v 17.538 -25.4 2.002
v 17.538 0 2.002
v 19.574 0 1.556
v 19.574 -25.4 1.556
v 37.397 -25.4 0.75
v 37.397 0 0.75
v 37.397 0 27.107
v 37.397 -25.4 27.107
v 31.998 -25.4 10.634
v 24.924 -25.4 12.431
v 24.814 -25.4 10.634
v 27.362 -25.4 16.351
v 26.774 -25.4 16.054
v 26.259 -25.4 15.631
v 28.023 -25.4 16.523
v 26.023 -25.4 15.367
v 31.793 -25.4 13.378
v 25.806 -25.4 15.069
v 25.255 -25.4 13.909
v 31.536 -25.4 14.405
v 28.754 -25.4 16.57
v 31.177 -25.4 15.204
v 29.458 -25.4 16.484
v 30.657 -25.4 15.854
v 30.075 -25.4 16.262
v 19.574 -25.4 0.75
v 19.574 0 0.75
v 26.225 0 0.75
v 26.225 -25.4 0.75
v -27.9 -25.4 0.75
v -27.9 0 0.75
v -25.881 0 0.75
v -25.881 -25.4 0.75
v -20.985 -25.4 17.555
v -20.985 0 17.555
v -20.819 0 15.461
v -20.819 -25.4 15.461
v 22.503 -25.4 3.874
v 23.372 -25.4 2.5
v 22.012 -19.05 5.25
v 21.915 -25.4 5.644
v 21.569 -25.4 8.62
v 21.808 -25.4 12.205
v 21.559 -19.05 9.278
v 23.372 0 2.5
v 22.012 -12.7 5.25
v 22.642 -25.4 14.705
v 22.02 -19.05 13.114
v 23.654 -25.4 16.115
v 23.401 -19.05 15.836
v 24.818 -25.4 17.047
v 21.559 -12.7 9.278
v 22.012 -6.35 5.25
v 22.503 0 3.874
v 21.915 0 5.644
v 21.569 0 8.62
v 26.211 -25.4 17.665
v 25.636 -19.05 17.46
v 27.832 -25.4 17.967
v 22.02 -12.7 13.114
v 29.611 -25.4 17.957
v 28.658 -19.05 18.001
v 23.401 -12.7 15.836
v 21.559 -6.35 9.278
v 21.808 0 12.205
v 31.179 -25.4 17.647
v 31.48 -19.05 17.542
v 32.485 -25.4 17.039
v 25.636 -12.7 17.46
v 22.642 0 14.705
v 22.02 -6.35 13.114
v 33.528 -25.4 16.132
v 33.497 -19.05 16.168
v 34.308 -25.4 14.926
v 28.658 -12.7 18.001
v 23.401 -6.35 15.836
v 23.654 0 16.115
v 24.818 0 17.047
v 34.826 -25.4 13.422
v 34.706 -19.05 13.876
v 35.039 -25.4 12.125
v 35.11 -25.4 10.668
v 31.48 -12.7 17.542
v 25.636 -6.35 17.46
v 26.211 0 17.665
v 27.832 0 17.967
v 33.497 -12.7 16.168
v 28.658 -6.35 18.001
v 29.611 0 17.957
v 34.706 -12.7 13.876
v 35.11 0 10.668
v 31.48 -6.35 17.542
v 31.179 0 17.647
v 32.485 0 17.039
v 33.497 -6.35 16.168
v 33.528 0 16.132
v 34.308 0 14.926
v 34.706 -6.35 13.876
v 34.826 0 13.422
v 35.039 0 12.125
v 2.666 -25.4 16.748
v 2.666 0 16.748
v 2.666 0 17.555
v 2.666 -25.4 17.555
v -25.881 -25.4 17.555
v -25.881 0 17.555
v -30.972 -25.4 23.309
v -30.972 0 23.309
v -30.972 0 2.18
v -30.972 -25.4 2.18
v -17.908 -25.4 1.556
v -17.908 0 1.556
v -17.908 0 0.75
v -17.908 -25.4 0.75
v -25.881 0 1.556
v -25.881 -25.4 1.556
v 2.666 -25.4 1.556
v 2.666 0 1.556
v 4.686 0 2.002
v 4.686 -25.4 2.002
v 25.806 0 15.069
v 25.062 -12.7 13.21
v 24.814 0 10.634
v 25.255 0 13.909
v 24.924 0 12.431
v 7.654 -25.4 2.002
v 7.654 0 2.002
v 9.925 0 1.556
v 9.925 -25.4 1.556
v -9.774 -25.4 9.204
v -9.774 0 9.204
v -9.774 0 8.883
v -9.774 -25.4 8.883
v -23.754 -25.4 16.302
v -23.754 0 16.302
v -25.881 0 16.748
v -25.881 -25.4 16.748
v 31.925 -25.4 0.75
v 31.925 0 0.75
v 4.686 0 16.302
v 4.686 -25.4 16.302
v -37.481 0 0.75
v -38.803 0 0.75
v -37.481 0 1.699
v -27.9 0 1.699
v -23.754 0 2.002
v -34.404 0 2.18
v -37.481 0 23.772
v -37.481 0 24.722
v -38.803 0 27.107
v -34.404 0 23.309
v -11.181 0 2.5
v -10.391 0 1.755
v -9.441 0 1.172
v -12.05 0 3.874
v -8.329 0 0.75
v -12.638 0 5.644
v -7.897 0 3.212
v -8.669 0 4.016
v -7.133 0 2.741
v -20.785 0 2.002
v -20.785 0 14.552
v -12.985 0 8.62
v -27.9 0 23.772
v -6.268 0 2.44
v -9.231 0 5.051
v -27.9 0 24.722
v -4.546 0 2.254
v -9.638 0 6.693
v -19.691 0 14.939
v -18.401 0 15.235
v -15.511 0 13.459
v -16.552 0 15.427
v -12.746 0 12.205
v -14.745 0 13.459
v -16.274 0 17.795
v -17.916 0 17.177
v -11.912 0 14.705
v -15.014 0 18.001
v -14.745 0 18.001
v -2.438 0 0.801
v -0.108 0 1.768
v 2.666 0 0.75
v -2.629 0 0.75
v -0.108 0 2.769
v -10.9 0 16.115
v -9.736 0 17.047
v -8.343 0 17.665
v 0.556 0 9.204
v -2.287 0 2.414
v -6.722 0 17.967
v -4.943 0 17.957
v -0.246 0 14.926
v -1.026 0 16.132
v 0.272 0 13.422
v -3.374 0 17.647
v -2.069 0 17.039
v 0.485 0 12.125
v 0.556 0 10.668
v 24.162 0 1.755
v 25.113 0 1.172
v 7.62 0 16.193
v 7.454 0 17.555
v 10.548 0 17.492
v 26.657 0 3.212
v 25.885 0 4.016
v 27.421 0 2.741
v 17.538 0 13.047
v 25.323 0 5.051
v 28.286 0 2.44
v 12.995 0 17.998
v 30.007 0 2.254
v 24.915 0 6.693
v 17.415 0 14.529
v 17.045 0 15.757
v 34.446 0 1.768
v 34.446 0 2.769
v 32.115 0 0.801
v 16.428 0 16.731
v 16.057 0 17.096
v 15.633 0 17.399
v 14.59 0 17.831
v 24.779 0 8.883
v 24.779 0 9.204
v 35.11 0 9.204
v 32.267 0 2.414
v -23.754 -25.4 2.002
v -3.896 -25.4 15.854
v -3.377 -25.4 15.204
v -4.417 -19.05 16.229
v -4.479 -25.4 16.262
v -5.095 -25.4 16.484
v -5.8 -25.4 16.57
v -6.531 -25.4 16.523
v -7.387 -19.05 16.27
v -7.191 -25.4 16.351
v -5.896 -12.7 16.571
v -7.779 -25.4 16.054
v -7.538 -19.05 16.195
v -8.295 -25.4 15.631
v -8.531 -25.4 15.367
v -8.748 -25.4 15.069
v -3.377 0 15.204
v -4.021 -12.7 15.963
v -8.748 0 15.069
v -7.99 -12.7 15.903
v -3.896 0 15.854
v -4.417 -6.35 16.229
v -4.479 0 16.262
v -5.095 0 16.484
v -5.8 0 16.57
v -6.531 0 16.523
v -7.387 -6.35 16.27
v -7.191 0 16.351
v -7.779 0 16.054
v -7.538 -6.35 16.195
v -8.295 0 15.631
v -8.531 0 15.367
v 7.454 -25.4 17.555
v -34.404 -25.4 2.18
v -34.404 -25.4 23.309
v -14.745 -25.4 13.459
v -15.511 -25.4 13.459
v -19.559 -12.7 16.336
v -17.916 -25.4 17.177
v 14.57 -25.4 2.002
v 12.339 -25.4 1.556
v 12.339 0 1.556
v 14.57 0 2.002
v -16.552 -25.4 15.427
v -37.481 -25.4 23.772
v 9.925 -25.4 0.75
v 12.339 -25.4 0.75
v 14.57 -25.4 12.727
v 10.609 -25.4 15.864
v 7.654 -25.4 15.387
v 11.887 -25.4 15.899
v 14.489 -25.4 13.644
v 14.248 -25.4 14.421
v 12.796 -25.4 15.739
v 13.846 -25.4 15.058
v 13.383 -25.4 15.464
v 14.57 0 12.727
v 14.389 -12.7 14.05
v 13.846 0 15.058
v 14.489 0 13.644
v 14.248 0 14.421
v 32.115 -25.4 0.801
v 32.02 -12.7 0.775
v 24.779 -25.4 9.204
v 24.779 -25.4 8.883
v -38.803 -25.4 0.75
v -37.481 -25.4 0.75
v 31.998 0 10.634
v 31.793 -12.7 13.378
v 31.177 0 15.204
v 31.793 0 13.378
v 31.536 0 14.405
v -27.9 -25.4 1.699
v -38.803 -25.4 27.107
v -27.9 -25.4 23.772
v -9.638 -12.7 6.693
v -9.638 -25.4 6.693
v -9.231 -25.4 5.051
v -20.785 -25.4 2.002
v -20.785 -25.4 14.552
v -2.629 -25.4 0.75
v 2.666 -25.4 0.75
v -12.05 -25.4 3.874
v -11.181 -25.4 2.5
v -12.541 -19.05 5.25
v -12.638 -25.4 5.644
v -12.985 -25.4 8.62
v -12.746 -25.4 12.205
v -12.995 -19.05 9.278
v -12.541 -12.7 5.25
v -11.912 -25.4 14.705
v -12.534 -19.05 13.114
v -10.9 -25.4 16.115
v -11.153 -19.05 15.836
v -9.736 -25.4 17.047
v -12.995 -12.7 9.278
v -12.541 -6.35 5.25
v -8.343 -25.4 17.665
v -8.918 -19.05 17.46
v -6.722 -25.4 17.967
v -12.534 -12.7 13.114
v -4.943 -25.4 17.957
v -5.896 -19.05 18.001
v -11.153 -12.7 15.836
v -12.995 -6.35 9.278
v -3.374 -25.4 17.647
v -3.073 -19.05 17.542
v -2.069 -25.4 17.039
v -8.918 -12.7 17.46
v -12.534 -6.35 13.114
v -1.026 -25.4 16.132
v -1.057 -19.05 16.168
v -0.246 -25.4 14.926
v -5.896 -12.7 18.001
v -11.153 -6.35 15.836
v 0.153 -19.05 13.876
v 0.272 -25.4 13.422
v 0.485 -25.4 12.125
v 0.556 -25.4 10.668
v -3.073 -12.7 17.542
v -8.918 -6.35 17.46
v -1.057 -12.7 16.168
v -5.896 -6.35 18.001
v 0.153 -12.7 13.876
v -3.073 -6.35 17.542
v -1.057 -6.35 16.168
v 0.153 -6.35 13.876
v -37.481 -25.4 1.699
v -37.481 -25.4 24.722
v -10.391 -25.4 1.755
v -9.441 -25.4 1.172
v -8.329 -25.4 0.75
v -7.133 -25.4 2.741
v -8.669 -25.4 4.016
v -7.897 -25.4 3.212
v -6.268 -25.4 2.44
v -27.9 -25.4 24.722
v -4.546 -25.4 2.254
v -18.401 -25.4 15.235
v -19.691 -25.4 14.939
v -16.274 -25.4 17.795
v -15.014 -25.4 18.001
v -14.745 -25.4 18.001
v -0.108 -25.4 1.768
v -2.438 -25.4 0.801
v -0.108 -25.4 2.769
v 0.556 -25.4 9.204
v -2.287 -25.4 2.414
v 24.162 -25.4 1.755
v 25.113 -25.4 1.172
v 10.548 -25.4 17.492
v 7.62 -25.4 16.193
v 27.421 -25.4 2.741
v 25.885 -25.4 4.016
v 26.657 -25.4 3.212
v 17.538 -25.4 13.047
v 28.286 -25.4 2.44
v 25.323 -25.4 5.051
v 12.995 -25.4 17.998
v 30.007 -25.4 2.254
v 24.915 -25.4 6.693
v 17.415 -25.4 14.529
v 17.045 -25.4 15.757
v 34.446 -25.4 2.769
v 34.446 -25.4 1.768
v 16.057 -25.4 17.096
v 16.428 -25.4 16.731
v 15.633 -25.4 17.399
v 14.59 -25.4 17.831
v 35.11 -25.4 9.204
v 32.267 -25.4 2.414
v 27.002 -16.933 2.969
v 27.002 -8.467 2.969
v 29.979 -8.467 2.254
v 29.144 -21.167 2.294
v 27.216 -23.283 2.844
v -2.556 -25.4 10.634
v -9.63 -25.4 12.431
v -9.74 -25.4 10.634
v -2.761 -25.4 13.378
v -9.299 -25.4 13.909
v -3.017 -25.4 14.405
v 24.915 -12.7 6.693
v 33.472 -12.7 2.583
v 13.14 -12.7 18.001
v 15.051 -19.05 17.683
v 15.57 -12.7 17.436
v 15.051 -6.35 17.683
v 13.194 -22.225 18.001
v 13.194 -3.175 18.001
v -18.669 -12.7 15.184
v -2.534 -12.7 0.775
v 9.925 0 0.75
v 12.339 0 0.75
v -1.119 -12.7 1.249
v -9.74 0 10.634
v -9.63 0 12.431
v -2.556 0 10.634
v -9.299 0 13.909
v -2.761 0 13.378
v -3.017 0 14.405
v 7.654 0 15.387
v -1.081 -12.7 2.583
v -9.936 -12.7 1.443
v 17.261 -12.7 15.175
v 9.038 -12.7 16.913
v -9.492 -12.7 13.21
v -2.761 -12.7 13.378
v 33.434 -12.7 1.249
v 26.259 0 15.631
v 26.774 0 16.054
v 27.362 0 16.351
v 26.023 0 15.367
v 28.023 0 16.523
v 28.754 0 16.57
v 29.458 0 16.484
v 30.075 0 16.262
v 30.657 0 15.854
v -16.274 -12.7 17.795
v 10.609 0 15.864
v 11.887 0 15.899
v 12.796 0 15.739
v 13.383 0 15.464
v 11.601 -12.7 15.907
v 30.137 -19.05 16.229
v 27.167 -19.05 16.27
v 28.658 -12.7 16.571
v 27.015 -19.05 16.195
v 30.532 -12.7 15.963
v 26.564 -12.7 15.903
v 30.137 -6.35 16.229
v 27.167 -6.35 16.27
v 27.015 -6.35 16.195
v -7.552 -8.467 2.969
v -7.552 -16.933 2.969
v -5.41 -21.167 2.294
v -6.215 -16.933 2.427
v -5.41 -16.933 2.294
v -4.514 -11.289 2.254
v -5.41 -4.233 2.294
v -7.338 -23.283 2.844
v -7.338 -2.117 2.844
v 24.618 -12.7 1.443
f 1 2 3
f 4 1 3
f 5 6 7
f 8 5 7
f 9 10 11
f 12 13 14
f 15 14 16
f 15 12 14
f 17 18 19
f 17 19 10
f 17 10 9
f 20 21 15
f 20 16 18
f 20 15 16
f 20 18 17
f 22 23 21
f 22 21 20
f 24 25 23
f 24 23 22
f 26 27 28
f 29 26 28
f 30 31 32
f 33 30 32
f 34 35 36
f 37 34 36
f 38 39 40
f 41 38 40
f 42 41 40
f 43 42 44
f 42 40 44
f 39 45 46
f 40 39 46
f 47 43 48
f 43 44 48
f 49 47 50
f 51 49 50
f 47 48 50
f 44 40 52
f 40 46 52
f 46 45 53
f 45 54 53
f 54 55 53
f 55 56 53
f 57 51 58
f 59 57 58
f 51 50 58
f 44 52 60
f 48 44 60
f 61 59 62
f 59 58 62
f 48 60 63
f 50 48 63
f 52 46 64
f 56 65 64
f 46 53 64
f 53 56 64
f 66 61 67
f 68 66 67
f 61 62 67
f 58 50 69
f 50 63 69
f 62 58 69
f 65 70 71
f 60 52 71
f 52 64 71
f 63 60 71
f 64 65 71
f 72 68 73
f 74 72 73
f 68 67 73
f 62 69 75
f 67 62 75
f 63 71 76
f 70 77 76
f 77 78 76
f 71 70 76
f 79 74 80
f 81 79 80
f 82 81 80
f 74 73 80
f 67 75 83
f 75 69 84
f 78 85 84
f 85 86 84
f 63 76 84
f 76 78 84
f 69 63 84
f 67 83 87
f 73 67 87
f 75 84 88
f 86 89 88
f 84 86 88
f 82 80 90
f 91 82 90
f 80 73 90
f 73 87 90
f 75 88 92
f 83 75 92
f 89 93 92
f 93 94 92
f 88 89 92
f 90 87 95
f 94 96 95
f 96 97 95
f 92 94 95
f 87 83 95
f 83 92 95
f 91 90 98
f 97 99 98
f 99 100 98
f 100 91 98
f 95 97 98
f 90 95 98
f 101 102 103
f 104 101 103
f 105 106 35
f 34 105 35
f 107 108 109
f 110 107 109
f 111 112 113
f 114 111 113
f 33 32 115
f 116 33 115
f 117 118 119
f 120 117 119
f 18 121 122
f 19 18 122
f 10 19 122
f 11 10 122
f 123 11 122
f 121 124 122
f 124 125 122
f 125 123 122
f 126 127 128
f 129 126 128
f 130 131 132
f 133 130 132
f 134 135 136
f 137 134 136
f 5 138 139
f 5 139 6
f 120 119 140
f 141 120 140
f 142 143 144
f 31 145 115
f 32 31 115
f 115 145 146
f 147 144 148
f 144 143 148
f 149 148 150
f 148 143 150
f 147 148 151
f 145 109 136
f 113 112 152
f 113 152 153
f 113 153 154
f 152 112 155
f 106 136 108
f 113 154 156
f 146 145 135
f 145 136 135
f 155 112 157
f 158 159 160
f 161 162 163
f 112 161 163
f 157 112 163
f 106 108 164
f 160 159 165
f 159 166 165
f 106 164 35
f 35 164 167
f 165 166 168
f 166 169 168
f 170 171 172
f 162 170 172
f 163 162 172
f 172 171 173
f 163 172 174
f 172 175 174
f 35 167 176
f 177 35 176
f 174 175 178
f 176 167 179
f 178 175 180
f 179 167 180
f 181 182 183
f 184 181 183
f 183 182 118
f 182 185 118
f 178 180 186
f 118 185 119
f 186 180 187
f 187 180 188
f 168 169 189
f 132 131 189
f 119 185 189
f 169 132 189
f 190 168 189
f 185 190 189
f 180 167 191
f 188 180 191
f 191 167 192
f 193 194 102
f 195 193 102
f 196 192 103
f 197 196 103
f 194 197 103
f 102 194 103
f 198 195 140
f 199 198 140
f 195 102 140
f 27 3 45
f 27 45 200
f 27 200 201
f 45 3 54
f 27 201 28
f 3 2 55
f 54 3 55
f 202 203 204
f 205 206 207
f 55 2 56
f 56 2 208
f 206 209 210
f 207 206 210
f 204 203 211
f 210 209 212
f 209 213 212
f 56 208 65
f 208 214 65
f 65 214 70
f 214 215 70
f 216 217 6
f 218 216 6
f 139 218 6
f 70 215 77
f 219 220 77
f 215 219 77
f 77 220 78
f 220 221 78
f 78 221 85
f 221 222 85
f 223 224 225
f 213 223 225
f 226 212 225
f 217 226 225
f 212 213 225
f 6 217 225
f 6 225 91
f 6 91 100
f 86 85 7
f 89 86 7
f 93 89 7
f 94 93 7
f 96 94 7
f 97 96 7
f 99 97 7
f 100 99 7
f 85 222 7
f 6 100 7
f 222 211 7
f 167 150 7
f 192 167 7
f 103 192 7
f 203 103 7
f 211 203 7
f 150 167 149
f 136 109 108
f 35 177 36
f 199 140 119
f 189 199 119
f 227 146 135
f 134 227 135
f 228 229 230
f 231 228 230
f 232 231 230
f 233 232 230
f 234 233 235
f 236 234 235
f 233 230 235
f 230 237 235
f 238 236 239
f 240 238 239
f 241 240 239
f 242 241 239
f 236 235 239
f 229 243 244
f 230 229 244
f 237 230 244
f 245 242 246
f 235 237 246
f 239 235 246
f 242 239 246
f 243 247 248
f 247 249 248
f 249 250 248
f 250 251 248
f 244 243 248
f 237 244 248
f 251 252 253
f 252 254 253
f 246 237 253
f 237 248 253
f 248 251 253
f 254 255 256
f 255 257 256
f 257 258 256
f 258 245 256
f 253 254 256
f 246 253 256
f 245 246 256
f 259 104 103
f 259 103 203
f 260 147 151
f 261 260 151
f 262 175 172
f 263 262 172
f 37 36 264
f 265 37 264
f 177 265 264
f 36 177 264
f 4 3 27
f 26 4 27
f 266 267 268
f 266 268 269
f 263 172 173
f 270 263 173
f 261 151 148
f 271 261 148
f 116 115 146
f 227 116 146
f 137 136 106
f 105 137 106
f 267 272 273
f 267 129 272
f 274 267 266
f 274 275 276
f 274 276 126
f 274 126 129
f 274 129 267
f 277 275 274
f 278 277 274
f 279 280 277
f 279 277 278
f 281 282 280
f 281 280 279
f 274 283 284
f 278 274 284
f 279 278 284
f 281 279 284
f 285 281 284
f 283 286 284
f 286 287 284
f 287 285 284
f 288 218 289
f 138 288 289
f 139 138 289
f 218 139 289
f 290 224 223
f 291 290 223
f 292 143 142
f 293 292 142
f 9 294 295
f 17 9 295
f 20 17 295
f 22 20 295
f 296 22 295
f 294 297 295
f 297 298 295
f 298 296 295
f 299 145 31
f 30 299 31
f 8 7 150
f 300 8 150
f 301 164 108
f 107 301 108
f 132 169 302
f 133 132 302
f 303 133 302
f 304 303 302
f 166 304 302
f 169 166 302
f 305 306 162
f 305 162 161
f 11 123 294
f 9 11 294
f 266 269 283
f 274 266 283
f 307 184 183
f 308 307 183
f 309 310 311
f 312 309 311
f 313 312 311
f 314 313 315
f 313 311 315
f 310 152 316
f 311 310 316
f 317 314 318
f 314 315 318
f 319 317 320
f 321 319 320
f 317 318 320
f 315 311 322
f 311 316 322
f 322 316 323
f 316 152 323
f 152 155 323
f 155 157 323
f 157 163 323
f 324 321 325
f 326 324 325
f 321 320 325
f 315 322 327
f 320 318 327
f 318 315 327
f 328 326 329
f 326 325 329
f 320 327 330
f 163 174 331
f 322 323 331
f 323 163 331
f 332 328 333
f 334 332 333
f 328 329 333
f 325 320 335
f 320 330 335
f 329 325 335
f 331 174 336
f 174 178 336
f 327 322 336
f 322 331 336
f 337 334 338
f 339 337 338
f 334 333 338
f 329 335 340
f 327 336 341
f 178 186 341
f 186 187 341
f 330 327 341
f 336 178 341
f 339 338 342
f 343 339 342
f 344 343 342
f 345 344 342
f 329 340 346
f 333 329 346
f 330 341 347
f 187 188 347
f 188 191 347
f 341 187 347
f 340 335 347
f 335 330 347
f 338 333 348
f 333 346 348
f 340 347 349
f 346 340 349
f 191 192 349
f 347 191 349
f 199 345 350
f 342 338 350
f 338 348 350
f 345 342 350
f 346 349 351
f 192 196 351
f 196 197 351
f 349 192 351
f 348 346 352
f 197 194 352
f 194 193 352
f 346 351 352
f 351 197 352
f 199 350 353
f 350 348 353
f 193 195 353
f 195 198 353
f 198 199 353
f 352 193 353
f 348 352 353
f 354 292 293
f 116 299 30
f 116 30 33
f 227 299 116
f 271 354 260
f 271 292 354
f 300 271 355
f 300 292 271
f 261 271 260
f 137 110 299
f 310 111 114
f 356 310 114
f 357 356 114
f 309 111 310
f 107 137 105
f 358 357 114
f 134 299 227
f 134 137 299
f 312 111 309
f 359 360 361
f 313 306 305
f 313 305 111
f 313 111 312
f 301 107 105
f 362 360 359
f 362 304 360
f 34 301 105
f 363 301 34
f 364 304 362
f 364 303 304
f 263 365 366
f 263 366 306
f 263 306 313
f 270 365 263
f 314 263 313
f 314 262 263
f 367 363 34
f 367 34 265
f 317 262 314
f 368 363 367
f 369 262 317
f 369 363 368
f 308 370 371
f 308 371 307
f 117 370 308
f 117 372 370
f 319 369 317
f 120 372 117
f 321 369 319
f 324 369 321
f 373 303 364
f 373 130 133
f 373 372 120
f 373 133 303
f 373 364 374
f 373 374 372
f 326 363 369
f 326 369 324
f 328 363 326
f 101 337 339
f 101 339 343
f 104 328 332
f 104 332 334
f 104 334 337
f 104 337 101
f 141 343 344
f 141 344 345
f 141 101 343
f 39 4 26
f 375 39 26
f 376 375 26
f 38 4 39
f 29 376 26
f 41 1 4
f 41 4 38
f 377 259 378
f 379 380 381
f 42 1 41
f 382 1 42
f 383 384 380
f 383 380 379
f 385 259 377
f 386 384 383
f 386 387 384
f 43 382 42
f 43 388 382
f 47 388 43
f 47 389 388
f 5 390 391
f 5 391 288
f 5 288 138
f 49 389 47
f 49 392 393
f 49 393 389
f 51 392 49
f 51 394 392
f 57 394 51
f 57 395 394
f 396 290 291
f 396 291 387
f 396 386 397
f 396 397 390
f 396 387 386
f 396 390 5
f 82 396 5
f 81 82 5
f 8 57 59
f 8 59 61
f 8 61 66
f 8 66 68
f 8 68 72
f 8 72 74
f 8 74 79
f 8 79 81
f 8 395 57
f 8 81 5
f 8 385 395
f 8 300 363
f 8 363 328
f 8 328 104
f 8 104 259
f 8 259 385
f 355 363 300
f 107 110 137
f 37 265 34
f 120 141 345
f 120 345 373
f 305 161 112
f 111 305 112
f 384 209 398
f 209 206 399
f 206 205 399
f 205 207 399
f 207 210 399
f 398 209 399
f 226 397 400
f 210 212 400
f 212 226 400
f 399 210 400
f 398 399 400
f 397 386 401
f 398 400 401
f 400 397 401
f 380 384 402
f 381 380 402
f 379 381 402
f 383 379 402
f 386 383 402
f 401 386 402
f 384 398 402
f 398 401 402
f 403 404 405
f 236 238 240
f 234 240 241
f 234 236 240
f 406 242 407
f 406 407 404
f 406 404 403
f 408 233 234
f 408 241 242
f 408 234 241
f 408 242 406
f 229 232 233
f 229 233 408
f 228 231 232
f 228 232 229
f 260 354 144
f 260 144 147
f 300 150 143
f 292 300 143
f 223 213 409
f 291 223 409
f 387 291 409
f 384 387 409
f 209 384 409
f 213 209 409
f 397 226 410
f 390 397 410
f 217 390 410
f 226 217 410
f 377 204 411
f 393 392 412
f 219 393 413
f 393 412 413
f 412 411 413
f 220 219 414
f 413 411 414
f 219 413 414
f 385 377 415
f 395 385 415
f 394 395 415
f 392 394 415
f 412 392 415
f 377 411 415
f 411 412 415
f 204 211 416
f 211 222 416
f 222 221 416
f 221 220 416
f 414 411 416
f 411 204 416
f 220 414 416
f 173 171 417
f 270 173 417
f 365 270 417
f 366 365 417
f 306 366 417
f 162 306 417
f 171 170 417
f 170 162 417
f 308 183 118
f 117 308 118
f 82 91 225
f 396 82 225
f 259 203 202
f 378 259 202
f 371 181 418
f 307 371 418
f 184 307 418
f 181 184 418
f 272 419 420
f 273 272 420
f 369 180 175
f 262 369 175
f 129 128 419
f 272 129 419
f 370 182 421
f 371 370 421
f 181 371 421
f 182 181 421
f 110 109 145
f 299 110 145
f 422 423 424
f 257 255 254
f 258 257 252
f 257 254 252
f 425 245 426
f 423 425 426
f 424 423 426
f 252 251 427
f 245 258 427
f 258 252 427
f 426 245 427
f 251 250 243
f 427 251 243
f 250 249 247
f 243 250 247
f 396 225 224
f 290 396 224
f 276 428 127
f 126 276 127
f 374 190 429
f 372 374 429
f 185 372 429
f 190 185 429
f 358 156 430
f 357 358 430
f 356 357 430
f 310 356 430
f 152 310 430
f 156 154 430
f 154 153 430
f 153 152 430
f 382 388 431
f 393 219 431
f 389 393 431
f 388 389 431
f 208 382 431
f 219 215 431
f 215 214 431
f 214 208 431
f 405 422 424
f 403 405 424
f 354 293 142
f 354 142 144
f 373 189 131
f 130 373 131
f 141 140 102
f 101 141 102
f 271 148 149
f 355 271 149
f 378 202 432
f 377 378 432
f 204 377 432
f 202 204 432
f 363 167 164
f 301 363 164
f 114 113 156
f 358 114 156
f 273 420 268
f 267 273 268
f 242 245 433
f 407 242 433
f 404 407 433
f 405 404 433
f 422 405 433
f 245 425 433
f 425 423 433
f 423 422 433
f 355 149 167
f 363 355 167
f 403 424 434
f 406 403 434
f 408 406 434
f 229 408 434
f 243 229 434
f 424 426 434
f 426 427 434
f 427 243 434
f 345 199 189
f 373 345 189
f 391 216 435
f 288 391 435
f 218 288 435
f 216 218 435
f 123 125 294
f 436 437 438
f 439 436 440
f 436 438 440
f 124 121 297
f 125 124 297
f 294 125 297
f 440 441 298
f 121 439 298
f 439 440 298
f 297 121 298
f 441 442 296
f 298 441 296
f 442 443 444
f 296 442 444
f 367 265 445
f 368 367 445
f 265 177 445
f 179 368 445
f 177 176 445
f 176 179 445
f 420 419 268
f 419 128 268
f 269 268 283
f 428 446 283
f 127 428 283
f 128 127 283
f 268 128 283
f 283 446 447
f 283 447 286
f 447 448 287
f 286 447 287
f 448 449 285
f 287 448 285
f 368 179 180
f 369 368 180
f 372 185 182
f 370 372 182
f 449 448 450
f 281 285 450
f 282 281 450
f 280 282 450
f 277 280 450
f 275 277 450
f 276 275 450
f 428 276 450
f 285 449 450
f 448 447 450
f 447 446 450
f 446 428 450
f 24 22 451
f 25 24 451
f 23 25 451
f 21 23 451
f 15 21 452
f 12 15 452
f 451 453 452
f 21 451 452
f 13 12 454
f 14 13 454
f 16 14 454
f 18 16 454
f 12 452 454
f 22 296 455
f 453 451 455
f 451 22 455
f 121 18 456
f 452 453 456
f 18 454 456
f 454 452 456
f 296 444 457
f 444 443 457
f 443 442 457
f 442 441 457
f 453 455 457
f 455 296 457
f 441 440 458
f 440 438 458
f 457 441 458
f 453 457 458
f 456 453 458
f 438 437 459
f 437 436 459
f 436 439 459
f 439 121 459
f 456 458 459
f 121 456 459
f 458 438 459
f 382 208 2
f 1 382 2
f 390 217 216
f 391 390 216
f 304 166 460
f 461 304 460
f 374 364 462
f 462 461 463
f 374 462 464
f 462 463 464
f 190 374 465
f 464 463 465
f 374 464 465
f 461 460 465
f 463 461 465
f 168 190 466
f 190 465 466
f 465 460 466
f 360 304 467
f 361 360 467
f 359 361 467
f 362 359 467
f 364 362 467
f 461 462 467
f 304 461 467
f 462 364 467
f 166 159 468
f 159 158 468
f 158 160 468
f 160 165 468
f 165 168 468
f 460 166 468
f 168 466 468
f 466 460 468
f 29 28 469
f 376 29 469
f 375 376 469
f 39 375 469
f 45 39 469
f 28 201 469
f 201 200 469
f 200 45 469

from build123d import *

# Parameters (mm, degrees)
F1_DEPTH = 25.4


with BuildPart() as f1:
    # F0 (on Front) → F1 (new body)
    with BuildSketch(Plane.XZ):
        with BuildLine():
            Line((37.3974812319, 27.1067991487), (-38.8025187681, 27.1067991487))
            Line((-38.8025187681, 27.1067991487), (-38.8025187681, 0.7496755936))
            Line((-38.8025187681, 0.7496755936), (-37.4812306732, 0.7496755936))
            Line((-37.4812306732, 0.7496755936), (-37.4812306732, 1.6991726661))
            Line((-37.4812306732, 1.6991726661), (-34.4039449803, 2.1796410643))
            Line((-34.4039449803, 2.1796410643), (-34.4039449803, 23.3088108586))
            Line((-34.4039449803, 23.3088108586), (-37.4812306732, 23.7721196711))
            Line((-37.4812306732, 23.7721196711), (-37.4812306732, 24.7216167436))
            Line((-37.4812306732, 24.7216167436), (-27.9004620198, 24.7216167436))
            Line((-27.9004620198, 24.7216167436), (-27.9004620198, 23.7721196711))
            Line((-27.9004620198, 23.7721196711), (-30.9720278508, 23.3088108586))
            Line((-30.9720278508, 23.3088108586), (-30.9720278508, 2.1796410643))
            Line((-30.9720278508, 2.1796410643), (-27.9004620198, 1.6991726661))
            Line((-27.9004620198, 1.6991726661), (-27.9004620198, 0.7496755936))
            Line((-27.9004620198, 0.7496755936), (-25.8813507753, 0.7496755936))
            Line((-25.8813507753, 0.7496755936), (-25.8813507753, 1.5561761191))
            Line((-25.8813507753, 1.5561761191), (-23.7535621549, 2.0023253459))
            Line((-23.7535621549, 2.0023253459), (-23.7535621549, 16.3019800524))
            Line((-23.7535621549, 16.3019800524), (-25.8813507753, 16.7481292793))
            Line((-25.8813507753, 16.7481292793), (-25.8813507753, 17.5546298047))
            Line((-25.8813507753, 17.5546298047), (-20.9851490038, 17.5546298047))
            Line((-20.9851490038, 17.5546298047), (-20.8192730092, 15.4611603557))
            add(Edge.make_bspline(
                [(-20.8192730092, 15.4611603557), (-19.7496588371, 16.3534588094), (-17.9164431038, 17.1771189205)],
                knots=[0, 0, 0, 1, 1, 1], degree=2))
            add(Edge.make_bspline(
                [(-17.9164431038, 17.1771189205), (-16.0832273704, 18.0007790316), (-15.0136131983, 18.0007790316)],
                knots=[0, 0, 0, 1, 1, 1], degree=2))
            Line((-15.0136131983, 18.0007790316), (-14.7447796899, 18.0007790316))
            Line((-14.7447796899, 18.0007790316), (-14.7447796899, 13.4592086968))
            Line((-14.7447796899, 13.4592086968), (-15.5112411821, 13.4592086968))
            Line((-15.5112411821, 13.4592086968), (-16.5522560448, 15.4268411844))
            add(Edge.make_bspline(
                [(-16.5522560448, 15.4268411844), (-17.4445544984, 15.4268411844), (-18.6686049413, 15.1837470544)],
                knots=[0, 0, 0, 1, 1, 1], degree=2))
            add(Edge.make_bspline(
                [(-18.6686049413, 15.1837470544), (-19.8926553842, 14.9406529244), (-20.7849538379, 14.5517023164)],
                knots=[0, 0, 0, 1, 1, 1], degree=2))
            Line((-20.7849538379, 14.5517023164), (-20.7849538379, 2.0023253459))
            Line((-20.7849538379, 2.0023253459), (-17.9078633109, 1.5561761191))
            Line((-17.9078633109, 1.5561761191), (-17.9078633109, 0.7496755936))
            Line((-17.9078633109, 0.7496755936), (-8.3285276719, 0.7496755936))
            add(Edge.make_bspline(
                [(-8.3285276719, 0.7496755936), (-10.11731664, 1.2614297437), (-11.181305737, 2.4999533297)],
                knots=[0.4131969353, 0.4131969353, 0.4131969353, 1, 1, 1], degree=2))
            add(Edge.make_bspline(
                [(-11.181305737, 2.4999533297), (-12.9945019538, 4.6105823644), (-12.9945019538, 9.2779896606)],
                knots=[0, 0, 0, 1, 1, 1], degree=2))
            add(Edge.make_bspline(
                [(-12.9945019538, 9.2779896606), (-12.9945019538, 13.6708435864), (-11.1527064276, 15.835811309)],
                knots=[0, 0, 0, 1, 1, 1], degree=2))
            add(Edge.make_bspline(
                [(-11.1527064276, 15.835811309), (-9.3109109014, 18.0007790316), (-5.8961533575, 18.0007790316)],
                knots=[0, 0, 0, 1, 1, 1], degree=2))
            add(Edge.make_bspline(
                [(-5.8961533575, 18.0007790316), (0.5558508461, 18.0007790316), (0.5558508461, 10.6679160981)],
                knots=[0, 0, 0, 1, 1, 1], degree=2))
            Line((0.5558508461, 10.6679160981), (0.5558508461, 9.2036314561))
            Line((0.5558508461, 9.2036314561), (-9.7742197139, 9.2036314561))
            Line((-9.7742197139, 9.2036314561), (-9.7742197139, 8.8833191907))
            add(Edge.make_bspline(
                [(-9.7742197139, 8.8833191907), (-9.7742197139, 6.4180587193), (-9.230832835, 5.0510117294)],
                knots=[0, 0, 0, 1, 1, 1], degree=2))
            add(Edge.make_bspline(
                [(-9.230832835, 5.0510117294), (-8.6874459562, 3.6839647394), (-7.5520533725, 2.9689820041)],
                knots=[0, 0, 0, 1, 1, 1], degree=2))
            add(Edge.make_bspline(
                [(-7.5520533725, 2.9689820041), (-6.4166607888, 2.2539992688), (-4.5748652626, 2.2539992688)],
                knots=[0, 0, 0, 1, 1, 1], degree=2))
            add(Edge.make_bspline(
                [(-4.5748652626, 2.2539992688), (-3.6082086044, 2.2539992688), (-2.2869205095, 2.4141554015)],
                knots=[0, 0, 0, 1, 1, 1], degree=2))
            add(Edge.make_bspline(
                [(-2.2869205095, 2.4141554015), (-0.9656324147, 2.5743115342), (-0.1076531323, 2.7687868382)],
                knots=[0, 0, 0, 1, 1, 1], degree=2))
            Line((-0.1076531323, 2.7687868382), (-0.1076531323, 1.7678110087))
            add(Edge.make_bspline(
                [(-0.1076531323, 1.7678110087), (-0.9656324147, 1.2129844061), (-2.4384968494, 0.8011543506)],
                knots=[0, 0, 0, 1, 1, 1], degree=2))
            add(Edge.make_bspline(
                [(-2.4384968494, 0.8011543506), (-2.5336227612, 0.7745560374), (-2.6290230549, 0.7496755936)],
                knots=[0, 0, 0, 0.0645856533, 0.0645856533, 0.0645856533], degree=2))
            Line((-2.6290230549, 0.7496755936), (2.6664798808, 0.7496755936))
            Line((2.6664798808, 0.7496755936), (2.6664798808, 1.5561761191))
            Line((2.6664798808, 1.5561761191), (4.6855911253, 2.0023253459))
            Line((4.6855911253, 2.0023253459), (4.6855911253, 16.3019800524))
            Line((4.6855911253, 16.3019800524), (2.6664798808, 16.7481292793))
            Line((2.6664798808, 16.7481292793), (2.6664798808, 17.5546298047))
            Line((2.6664798808, 17.5546298047), (7.4540042765, 17.5546298047))
            Line((7.4540042765, 17.5546298047), (7.6198802711, 16.1933026767))
            add(Edge.make_bspline(
                [(7.6198802711, 16.1933026767), (8.9926471229, 16.9826436165), (10.548449555, 17.491711324)],
                knots=[0, 0, 0, 1, 1, 1], degree=2))
            add(Edge.make_bspline(
                [(10.548449555, 17.491711324), (12.1042519871, 18.0007790316), (13.1395469878, 18.0007790316)],
                knots=[0, 0, 0, 1, 1, 1], degree=2))
            add(Edge.make_bspline(
                [(13.1395469878, 18.0007790316), (15.3188143651, 18.0007790316), (16.4284675703, 16.7309696936)],
                knots=[0, 0, 0, 1, 1, 1], degree=2))
            add(Edge.make_bspline(
                [(16.4284675703, 16.7309696936), (17.5381207755, 15.4611603557), (17.5381207755, 13.0473786412)],
                knots=[0, 0, 0, 1, 1, 1], degree=2))
            Line((17.5381207755, 13.0473786412), (17.5381207755, 2.0023253459))
            Line((17.5381207755, 2.0023253459), (19.5743916057, 1.5561761191))
            Line((19.5743916057, 1.5561761191), (19.5743916057, 0.7496755936))
            Line((19.5743916057, 0.7496755936), (26.2251579609, 0.7496755936))
            add(Edge.make_bspline(
                [(26.2251579609, 0.7496755936), (24.4363689928, 1.2614297437), (23.3723798958, 2.4999533297)],
                knots=[0.4131969353, 0.4131969353, 0.4131969353, 1, 1, 1], degree=2))
            add(Edge.make_bspline(
                [(23.3723798958, 2.4999533297), (21.559183679, 4.6105823644), (21.559183679, 9.2779896606)],
                knots=[0, 0, 0, 1, 1, 1], degree=2))
            add(Edge.make_bspline(
                [(21.559183679, 9.2779896606), (21.559183679, 13.6708435864), (23.4009792052, 15.835811309)],
                knots=[0, 0, 0, 1, 1, 1], degree=2))
            add(Edge.make_bspline(
                [(23.4009792052, 15.835811309), (25.2427747314, 18.0007790316), (28.6575322753, 18.0007790316)],
                knots=[0, 0, 0, 1, 1, 1], degree=2))
            add(Edge.make_bspline(
                [(28.6575322753, 18.0007790316), (35.1095364789, 18.0007790316), (35.1095364789, 10.6679160981)],
                knots=[0, 0, 0, 1, 1, 1], degree=2))
            Line((35.1095364789, 10.6679160981), (35.1095364789, 9.2036314561))
            Line((35.1095364789, 9.2036314561), (24.7794659189, 9.2036314561))
            Line((24.7794659189, 9.2036314561), (24.7794659189, 8.8833191907))
            add(Edge.make_bspline(
                [(24.7794659189, 8.8833191907), (24.7794659189, 6.4180587193), (25.3228527978, 5.0510117294)],
                knots=[0, 0, 0, 1, 1, 1], degree=2))
            add(Edge.make_bspline(
                [(25.3228527978, 5.0510117294), (25.8662396766, 3.6839647394), (27.0016322603, 2.9689820041)],
                knots=[0, 0, 0, 1, 1, 1], degree=2))
            add(Edge.make_bspline(
                [(27.0016322603, 2.9689820041), (28.137024844, 2.2539992688), (29.9788203702, 2.2539992688)],
                knots=[0, 0, 0, 1, 1, 1], degree=2))
            add(Edge.make_bspline(
                [(29.9788203702, 2.2539992688), (30.9454770284, 2.2539992688), (32.2667651232, 2.4141554015)],
                knots=[0, 0, 0, 1, 1, 1], degree=2))
            add(Edge.make_bspline(
                [(32.2667651232, 2.4141554015), (33.5880532181, 2.5743115342), (34.4460325005, 2.7687868382)],
                knots=[0, 0, 0, 1, 1, 1], degree=2))
            Line((34.4460325005, 2.7687868382), (34.4460325005, 1.7678110087))
            add(Edge.make_bspline(
                [(34.4460325005, 1.7678110087), (33.5880532181, 1.2129844061), (32.1151887834, 0.8011543506)],
                knots=[0, 0, 0, 1, 1, 1], degree=2))
            add(Edge.make_bspline(
                [(32.1151887834, 0.8011543506), (32.0200628716, 0.7745560374), (31.9246625779, 0.7496755936)],
                knots=[0, 0, 0, 0.0645856533, 0.0645856533, 0.0645856533], degree=2))
            Line((31.9246625779, 0.7496755936), (37.3974812319, 0.7496755936))
            Line((37.3974812319, 0.7496755936), (37.3974812319, 27.1067991487))
        make_face()
    extrude(amount=F1_DEPTH)


with BuildPart() as f1b:
    # F0 (on Front) → F1, piece 2 (new body)
    with BuildSketch(Plane.XZ):
        with BuildLine():
            Line((9.9249846098, 0.7496755936), (12.3387663243, 0.7496755936))
            Line((12.3387663243, 0.7496755936), (12.3387663243, 1.5561761191))
            Line((12.3387663243, 1.5561761191), (14.5695124585, 2.0023253459))
            Line((14.5695124585, 2.0023253459), (14.5695124585, 12.7270663758))
            add(Edge.make_bspline(
                [(14.5695124585, 12.7270663758), (14.5695124585, 14.2085106034), (13.8459499303, 15.057910093)],
                knots=[0, 0, 0, 1, 1, 1], degree=2))
            add(Edge.make_bspline(
                [(13.8459499303, 15.057910093), (13.1223874022, 15.9073095825), (11.6009041414, 15.9073095825)],
                knots=[0, 0, 0, 1, 1, 1], degree=2))
            add(Edge.make_bspline(
                [(11.6009041414, 15.9073095825), (9.9936229524, 15.9073095825), (7.6541994424, 15.3868021512)],
                knots=[0, 0, 0, 1, 1, 1], degree=2))
            Line((7.6541994424, 15.3868021512), (7.6541994424, 2.0023253459))
            Line((7.6541994424, 2.0023253459), (9.9249846098, 1.5561761191))
            Line((9.9249846098, 1.5561761191), (9.9249846098, 0.7496755936))
        make_face()
    extrude(amount=F1_DEPTH)


with BuildPart() as f1c:
    # F0 (on Front) → F1, piece 3 (new body)
    with BuildSketch(Plane.XZ):
        with BuildLine():
            add(Edge.make_bspline(
                [(31.1771314346, 15.203766571), (30.3563312545, 16.5708135609), (28.6575322753, 16.5708135609)],
                knots=[0, 0, 0, 1, 1, 1], degree=2))
            add(Edge.make_bspline(
                [(28.6575322753, 16.5708135609), (26.7985771635, 16.5708135609), (25.8061811268, 15.0693498167)],
                knots=[0, 0, 0, 1, 1, 1], degree=2))
            add(Edge.make_bspline(
                [(25.8061811268, 15.0693498167), (24.8137850902, 13.5678860725), (24.8137850902, 10.6335969268)],
                knots=[0, 0, 0, 1, 1, 1], degree=2))
            Line((24.8137850902, 10.6335969268), (31.9979316148, 10.6335969268))
            add(Edge.make_bspline(
                [(31.9979316148, 10.6335969268), (31.9979316148, 13.836719581), (31.1771314346, 15.203766571)],
                knots=[0, 0, 0, 1, 1, 1], degree=2))
        make_face()
    extrude(amount=F1_DEPTH)


with BuildPart() as f1d:
    # F0 (on Front) → F1, piece 4 (new body)
    with BuildSketch(Plane.XZ):
        with BuildLine():
            add(Edge.make_bspline(
                [(-3.3765541982, 15.203766571), (-4.1973543783, 16.5708135609), (-5.8961533575, 16.5708135609)],
                knots=[0, 0, 0, 1, 1, 1], degree=2))
            add(Edge.make_bspline(
                [(-5.8961533575, 16.5708135609), (-7.7551084693, 16.5708135609), (-8.7475045059, 15.0693498167)],
                knots=[0, 0, 0, 1, 1, 1], degree=2))
            add(Edge.make_bspline(
                [(-8.7475045059, 15.0693498167), (-9.7399005426, 13.5678860725), (-9.7399005426, 10.6335969268)],
                knots=[0, 0, 0, 1, 1, 1], degree=2))
            Line((-9.7399005426, 10.6335969268), (-2.555754018, 10.6335969268))
            add(Edge.make_bspline(
                [(-2.555754018, 10.6335969268), (-2.555754018, 13.836719581), (-3.3765541982, 15.203766571)],
                knots=[0, 0, 0, 1, 1, 1], degree=2))
        make_face()
    extrude(amount=F1_DEPTH)


solid = Compound([f1.part, f1b.part, f1c.part, f1d.part])
